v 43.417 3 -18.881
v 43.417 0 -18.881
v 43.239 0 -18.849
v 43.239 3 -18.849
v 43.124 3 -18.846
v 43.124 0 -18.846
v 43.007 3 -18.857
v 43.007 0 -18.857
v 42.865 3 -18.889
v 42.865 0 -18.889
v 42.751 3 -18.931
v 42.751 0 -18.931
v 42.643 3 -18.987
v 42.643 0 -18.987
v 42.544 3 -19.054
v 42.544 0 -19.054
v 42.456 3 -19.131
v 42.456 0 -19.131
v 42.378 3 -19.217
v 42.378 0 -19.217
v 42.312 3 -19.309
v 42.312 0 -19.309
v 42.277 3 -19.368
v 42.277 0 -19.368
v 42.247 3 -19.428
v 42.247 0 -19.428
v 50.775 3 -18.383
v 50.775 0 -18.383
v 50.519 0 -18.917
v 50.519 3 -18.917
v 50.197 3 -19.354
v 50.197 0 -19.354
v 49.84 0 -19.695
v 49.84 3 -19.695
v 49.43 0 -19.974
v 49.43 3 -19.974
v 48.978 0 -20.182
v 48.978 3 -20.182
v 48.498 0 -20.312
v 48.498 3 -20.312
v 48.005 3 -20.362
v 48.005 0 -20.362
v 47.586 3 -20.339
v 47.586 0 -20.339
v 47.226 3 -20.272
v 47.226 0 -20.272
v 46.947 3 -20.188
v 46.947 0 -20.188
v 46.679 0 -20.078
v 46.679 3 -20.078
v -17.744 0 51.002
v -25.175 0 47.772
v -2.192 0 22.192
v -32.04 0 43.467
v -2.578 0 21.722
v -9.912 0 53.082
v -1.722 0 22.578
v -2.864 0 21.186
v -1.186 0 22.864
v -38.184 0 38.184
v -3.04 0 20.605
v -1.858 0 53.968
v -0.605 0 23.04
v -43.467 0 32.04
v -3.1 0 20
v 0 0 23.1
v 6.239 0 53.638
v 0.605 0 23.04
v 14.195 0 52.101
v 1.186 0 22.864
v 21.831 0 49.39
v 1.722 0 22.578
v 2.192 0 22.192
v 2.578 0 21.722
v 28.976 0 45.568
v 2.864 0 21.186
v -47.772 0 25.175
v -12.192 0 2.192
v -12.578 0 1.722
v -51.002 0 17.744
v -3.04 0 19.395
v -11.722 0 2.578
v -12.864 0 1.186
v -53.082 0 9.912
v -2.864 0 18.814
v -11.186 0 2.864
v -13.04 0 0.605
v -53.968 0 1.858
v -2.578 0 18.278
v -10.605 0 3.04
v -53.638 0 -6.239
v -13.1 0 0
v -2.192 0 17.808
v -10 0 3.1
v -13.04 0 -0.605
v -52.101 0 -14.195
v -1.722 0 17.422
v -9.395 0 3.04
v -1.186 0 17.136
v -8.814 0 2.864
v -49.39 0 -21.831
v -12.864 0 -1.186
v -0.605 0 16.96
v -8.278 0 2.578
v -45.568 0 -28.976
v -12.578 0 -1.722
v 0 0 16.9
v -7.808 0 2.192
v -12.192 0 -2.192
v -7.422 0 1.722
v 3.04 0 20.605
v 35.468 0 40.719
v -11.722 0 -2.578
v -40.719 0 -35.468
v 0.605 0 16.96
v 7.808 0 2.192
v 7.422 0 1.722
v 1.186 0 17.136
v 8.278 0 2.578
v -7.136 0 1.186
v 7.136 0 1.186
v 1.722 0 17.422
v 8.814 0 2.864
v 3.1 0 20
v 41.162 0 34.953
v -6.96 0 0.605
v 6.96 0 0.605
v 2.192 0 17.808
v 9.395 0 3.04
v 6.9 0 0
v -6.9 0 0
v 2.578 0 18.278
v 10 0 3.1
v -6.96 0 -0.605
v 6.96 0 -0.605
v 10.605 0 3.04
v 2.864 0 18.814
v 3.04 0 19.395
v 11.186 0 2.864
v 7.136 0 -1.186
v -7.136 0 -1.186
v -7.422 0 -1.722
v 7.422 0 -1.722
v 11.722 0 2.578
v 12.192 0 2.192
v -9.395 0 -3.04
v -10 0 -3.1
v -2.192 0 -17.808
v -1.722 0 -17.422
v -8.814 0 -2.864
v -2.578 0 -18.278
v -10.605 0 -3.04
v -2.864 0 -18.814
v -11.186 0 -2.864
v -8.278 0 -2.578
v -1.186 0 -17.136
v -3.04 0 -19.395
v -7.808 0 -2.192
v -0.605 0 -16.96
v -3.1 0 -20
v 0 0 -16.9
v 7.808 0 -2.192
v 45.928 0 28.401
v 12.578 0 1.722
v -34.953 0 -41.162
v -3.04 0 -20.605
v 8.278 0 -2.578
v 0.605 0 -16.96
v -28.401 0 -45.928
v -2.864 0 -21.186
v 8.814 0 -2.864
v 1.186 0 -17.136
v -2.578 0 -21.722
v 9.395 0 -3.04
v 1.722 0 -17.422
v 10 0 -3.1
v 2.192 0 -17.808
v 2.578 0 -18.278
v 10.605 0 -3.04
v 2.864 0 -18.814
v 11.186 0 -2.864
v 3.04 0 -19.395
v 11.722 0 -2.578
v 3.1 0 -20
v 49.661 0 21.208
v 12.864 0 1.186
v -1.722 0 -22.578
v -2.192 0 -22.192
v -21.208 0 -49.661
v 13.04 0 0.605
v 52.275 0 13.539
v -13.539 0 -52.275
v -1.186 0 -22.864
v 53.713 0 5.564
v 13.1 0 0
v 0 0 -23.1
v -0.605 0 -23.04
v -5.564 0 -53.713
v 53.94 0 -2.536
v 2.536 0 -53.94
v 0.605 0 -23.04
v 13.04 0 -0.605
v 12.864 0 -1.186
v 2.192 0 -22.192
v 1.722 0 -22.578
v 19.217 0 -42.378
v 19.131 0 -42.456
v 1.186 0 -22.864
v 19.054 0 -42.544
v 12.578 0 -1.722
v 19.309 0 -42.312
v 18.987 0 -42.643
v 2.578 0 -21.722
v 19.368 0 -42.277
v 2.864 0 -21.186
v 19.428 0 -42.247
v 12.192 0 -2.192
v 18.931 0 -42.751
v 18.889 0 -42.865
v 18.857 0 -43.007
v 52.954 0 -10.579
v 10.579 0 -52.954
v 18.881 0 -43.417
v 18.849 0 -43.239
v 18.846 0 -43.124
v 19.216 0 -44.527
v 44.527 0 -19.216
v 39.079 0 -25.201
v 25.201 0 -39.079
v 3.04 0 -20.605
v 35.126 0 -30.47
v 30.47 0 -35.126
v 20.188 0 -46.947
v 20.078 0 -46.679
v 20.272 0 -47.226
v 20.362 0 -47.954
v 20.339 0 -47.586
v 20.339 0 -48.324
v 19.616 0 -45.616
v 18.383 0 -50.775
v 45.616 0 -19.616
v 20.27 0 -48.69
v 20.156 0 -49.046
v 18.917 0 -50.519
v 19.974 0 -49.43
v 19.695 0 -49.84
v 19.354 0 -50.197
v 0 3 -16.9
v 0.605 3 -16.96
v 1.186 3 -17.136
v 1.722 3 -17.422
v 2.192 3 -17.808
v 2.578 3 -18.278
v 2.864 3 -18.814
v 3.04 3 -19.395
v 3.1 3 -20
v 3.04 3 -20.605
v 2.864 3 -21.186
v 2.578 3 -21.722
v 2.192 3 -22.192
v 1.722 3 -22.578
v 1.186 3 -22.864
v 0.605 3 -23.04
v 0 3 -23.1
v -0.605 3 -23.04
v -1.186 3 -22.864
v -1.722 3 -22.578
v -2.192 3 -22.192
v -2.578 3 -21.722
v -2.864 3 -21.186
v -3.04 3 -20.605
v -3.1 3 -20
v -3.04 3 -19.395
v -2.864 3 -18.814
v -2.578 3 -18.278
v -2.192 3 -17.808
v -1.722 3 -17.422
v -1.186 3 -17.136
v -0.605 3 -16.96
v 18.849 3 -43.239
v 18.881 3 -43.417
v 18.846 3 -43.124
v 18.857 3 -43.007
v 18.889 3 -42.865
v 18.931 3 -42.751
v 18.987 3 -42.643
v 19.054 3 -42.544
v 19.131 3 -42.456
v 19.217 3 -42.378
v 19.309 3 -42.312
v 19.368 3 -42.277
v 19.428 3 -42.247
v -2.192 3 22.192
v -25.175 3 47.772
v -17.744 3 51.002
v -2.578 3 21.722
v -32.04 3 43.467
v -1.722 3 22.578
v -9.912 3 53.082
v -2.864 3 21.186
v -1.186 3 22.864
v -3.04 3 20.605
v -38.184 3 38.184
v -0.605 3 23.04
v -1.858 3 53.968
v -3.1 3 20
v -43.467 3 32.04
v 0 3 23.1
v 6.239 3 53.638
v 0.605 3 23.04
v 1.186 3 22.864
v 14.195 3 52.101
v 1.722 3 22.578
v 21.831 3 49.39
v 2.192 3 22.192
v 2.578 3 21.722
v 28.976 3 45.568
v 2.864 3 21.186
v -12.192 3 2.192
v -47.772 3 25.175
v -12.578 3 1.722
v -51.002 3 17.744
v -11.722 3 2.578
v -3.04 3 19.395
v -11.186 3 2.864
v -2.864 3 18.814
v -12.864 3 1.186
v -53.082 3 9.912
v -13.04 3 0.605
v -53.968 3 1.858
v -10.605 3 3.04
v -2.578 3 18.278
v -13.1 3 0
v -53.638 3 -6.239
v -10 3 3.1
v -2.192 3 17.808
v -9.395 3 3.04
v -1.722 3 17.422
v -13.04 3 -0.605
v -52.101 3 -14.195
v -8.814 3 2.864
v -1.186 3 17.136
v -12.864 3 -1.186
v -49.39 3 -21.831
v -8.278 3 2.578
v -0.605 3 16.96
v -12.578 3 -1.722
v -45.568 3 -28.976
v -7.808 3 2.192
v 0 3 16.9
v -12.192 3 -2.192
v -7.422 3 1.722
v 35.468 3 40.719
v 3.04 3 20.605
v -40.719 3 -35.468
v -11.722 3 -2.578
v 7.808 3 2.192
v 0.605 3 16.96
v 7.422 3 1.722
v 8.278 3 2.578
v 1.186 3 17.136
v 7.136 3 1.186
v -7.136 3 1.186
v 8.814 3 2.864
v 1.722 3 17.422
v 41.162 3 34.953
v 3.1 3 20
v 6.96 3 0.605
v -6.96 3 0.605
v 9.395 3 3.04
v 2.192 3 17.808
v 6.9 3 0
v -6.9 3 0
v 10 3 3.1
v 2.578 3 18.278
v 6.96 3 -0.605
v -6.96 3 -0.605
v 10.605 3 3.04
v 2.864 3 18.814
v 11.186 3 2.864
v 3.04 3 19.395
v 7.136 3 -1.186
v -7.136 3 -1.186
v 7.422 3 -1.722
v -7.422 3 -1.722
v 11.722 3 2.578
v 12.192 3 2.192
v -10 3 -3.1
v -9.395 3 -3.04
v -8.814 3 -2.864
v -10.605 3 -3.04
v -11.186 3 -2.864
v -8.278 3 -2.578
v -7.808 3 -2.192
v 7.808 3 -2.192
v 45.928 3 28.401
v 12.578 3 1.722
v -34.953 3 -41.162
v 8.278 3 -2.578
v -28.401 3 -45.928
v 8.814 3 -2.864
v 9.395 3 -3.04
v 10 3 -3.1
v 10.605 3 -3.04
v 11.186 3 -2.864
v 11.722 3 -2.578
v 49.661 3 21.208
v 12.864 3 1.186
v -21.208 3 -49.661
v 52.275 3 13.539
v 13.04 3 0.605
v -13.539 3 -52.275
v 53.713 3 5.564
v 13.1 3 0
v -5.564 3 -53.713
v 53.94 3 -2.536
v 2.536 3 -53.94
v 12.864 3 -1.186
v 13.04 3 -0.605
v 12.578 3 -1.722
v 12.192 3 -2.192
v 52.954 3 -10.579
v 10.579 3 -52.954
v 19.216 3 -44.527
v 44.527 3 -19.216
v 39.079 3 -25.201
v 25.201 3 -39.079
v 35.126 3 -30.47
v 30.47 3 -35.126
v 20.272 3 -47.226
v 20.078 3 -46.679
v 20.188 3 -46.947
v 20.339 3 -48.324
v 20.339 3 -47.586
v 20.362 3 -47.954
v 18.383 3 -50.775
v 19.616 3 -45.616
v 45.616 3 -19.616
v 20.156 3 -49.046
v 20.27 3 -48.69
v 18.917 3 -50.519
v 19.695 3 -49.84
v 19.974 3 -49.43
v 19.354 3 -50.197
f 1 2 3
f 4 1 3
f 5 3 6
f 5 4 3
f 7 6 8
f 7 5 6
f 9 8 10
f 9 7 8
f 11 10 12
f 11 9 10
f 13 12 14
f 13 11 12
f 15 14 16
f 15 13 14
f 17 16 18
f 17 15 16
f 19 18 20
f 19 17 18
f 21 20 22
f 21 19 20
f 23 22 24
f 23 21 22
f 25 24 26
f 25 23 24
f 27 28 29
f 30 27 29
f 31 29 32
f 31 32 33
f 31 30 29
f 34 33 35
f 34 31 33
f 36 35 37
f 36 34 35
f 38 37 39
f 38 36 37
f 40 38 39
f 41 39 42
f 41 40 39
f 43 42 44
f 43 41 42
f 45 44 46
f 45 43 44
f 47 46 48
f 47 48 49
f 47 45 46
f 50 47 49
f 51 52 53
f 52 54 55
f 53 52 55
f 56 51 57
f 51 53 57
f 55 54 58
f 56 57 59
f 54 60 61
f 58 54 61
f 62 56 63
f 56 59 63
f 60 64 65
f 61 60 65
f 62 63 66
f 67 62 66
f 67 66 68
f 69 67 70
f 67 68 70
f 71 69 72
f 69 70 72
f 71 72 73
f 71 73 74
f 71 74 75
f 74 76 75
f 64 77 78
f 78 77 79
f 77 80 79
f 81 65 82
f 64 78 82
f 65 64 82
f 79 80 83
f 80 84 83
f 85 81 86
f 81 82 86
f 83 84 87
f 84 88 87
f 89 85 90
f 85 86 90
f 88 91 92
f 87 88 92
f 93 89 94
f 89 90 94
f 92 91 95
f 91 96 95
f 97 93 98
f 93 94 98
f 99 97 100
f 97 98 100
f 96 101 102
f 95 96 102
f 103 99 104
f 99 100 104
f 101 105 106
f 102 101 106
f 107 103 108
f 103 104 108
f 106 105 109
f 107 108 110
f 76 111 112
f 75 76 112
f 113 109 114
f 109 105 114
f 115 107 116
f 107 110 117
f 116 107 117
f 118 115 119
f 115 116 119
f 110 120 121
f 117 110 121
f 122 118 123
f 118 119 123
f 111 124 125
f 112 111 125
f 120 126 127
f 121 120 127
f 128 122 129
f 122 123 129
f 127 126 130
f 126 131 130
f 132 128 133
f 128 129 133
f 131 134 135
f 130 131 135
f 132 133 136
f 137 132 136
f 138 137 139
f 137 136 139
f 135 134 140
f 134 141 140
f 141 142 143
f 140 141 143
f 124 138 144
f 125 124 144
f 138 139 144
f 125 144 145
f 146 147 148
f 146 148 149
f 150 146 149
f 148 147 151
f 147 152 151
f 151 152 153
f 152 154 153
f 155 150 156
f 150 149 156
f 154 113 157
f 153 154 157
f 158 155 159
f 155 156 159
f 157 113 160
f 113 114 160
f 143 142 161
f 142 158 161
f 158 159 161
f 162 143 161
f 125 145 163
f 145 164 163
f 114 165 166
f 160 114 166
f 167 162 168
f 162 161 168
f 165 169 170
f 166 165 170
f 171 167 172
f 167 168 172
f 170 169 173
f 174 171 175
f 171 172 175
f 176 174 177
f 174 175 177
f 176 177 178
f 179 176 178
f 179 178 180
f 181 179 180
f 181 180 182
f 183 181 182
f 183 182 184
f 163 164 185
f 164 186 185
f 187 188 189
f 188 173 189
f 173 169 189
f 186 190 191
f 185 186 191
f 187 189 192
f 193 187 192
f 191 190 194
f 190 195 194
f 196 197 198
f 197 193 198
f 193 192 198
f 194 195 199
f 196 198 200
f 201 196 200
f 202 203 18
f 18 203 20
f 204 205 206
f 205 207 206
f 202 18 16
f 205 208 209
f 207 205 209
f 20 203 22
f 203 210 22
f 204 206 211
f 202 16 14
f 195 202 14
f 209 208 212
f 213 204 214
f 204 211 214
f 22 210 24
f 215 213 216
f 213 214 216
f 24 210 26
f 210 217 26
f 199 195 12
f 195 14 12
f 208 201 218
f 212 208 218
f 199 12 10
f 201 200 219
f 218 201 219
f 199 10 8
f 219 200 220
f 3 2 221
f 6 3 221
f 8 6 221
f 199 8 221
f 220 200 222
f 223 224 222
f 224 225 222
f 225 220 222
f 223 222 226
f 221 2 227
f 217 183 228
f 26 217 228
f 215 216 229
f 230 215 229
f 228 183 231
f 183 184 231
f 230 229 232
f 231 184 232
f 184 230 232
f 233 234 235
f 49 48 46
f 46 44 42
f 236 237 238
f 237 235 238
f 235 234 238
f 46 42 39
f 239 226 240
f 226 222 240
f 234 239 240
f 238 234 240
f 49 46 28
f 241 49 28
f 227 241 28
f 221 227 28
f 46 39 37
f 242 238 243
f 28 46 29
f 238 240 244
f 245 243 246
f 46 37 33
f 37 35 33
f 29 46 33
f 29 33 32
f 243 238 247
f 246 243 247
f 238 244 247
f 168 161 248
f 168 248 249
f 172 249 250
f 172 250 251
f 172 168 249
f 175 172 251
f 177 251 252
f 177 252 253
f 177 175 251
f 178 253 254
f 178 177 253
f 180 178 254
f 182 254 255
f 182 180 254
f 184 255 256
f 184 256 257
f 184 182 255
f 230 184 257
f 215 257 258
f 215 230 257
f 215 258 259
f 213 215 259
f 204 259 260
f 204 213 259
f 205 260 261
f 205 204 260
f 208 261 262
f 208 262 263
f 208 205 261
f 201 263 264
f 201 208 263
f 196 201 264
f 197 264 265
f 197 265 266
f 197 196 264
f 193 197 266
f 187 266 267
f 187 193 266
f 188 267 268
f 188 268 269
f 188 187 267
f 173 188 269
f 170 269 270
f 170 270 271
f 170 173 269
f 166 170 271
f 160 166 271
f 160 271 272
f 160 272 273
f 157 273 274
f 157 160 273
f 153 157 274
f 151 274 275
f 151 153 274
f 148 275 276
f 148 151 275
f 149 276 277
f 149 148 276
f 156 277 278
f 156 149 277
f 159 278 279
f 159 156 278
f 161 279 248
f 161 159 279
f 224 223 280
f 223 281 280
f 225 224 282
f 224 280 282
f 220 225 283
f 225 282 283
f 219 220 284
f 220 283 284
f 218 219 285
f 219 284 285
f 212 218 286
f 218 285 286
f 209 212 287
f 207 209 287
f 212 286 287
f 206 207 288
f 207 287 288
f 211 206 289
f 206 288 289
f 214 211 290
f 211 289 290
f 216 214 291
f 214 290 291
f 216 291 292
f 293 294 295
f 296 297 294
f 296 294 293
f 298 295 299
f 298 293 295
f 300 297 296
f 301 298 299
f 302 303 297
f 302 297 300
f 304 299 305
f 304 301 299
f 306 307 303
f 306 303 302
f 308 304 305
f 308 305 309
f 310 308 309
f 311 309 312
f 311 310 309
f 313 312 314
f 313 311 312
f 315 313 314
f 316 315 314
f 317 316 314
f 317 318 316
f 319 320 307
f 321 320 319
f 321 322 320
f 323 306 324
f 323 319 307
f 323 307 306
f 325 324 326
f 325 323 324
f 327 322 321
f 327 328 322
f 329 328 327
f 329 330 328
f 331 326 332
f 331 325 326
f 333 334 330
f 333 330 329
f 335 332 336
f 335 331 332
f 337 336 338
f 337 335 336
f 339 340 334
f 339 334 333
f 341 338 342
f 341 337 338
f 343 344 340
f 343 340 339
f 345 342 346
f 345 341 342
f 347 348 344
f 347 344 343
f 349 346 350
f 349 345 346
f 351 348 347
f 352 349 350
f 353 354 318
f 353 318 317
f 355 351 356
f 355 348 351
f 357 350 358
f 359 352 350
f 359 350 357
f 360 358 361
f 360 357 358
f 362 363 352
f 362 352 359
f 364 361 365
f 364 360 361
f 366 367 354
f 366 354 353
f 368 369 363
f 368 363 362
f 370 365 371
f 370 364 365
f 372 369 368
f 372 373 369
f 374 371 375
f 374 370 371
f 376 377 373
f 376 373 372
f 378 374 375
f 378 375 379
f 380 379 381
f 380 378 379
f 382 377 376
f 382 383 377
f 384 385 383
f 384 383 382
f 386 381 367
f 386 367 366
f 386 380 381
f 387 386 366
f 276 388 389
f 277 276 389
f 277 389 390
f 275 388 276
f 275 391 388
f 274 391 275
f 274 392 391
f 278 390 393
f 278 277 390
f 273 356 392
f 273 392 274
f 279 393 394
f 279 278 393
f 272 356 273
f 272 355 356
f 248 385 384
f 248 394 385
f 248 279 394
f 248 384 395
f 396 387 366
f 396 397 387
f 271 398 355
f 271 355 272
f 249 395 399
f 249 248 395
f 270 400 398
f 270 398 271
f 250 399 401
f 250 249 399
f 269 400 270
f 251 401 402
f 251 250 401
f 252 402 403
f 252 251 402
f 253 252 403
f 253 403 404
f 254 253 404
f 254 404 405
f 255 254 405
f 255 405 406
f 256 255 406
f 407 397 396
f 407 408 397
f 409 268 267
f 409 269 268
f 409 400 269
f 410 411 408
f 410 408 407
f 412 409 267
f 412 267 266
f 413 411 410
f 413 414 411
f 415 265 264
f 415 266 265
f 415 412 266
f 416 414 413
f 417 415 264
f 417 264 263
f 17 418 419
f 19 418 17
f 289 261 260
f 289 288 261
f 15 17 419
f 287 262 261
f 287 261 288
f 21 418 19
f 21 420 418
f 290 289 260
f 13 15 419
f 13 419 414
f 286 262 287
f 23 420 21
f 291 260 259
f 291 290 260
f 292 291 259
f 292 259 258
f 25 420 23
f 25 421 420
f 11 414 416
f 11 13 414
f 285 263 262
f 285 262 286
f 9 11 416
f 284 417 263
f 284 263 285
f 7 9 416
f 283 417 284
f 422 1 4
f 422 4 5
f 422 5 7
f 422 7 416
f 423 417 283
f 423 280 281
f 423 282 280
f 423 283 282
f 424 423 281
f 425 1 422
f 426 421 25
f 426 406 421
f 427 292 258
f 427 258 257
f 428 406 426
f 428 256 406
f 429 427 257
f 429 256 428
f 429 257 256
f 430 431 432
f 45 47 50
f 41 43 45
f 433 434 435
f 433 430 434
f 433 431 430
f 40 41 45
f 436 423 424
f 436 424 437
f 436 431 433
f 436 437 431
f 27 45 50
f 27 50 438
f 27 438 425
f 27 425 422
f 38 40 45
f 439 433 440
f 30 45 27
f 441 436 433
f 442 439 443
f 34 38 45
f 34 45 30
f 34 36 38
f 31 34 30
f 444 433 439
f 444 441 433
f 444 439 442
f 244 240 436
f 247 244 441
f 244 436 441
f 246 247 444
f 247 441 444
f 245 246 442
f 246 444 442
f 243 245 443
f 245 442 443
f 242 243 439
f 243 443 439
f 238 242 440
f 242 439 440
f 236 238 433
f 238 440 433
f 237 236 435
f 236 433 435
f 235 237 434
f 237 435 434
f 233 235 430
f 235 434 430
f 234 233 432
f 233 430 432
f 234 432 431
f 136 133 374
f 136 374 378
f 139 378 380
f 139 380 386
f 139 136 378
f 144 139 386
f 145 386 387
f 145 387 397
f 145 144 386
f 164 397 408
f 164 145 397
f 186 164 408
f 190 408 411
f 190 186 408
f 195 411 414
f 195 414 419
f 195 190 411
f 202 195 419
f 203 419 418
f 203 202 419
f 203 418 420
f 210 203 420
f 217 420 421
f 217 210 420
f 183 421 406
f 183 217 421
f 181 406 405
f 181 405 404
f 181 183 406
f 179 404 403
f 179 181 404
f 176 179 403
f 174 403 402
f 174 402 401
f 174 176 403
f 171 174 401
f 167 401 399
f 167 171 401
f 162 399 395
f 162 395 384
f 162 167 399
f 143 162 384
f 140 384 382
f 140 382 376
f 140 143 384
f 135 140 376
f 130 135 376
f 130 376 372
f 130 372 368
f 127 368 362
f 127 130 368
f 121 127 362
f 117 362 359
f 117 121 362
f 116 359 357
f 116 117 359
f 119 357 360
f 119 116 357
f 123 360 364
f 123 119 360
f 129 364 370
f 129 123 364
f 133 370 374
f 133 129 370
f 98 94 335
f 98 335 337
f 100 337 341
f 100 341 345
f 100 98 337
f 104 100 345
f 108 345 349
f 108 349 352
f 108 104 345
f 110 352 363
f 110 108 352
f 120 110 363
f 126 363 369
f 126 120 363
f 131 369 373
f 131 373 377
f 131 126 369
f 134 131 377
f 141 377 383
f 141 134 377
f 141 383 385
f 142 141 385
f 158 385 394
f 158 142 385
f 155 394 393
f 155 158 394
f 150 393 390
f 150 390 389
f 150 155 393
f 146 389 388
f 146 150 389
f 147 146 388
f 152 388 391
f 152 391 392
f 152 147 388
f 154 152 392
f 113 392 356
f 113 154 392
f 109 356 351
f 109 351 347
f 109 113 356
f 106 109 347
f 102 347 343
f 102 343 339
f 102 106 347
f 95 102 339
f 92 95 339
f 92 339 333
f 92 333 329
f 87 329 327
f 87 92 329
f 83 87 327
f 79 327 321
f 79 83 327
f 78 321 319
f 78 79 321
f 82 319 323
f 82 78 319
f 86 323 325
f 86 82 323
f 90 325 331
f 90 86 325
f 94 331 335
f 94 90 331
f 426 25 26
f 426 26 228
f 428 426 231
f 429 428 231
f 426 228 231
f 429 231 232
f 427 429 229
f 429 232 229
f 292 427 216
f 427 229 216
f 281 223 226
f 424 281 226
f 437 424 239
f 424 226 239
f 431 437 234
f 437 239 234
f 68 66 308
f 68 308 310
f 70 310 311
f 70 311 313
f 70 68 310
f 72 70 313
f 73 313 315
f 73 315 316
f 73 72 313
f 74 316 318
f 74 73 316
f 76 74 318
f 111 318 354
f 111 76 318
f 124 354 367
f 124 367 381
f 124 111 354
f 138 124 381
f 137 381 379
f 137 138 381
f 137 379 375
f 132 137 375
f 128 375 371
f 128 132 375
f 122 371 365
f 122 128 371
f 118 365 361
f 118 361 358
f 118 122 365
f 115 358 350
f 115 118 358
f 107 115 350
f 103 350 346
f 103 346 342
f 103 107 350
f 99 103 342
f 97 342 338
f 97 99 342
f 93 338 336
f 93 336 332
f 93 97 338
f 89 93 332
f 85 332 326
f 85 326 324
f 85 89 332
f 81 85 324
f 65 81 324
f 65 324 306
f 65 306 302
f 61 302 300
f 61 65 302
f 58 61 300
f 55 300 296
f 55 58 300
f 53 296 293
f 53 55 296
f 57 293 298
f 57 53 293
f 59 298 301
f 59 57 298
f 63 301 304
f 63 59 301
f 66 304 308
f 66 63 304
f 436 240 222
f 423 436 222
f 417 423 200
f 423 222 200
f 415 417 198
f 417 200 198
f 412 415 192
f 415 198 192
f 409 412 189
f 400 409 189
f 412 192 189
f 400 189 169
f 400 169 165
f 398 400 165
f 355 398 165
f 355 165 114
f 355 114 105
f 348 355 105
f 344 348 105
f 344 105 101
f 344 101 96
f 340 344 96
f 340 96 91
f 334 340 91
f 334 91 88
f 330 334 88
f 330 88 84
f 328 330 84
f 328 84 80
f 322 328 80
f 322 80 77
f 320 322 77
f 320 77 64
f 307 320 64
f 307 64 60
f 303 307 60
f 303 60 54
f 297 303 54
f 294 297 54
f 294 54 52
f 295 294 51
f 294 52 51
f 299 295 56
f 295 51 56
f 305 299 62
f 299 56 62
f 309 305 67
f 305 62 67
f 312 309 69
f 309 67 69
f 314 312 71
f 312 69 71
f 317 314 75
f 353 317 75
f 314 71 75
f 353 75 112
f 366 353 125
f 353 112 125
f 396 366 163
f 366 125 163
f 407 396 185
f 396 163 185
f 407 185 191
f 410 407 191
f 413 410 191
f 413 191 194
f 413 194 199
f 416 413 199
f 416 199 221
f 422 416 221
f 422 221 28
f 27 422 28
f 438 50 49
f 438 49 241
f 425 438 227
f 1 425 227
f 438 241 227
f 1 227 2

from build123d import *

# Parameters (mm, degrees)
SKETCH1_R           = 3.1
BOSS_EXTRUDE1_DEPTH = 3
FILLET1_R           = 3
FILLET2_R           = 1


with BuildPart() as part:
    # Sketch1 → Boss-Extrude1 (new body)
    with BuildSketch(Plane(origin=(0, 0, 0), x_dir=(1, 0, 0), z_dir=(0, 1, 0))):
        with BuildLine():
            ThreePointArc((21.667324002, 49.462380357), (-38.183766184, -38.183766184), (49.462380357, 21.667324002))
            ThreePointArc((49.462380357, 21.667324002), (46.165505457, 19.845504593), (42.585510083, 18.674162122))
            ThreePointArc((42.585510083, 18.674162122), (32.880465325, 32.880465325), (18.674162122, 42.585510083))
            ThreePointArc((18.674162122, 42.585510083), (19.845504593, 46.165505457), (21.667324002, 49.462380357))
        make_face()
        with Locations(Location((10, 0, 0), (0, 0, 270))):
            Circle(SKETCH1_R, mode=Mode.SUBTRACT)
        with Locations(Location((0, 20, 0), (0, 0, 270))):
            Circle(SKETCH1_R, mode=Mode.SUBTRACT)
        with Locations(Location((0, -20, 0), (0, 0, 270))):
            Circle(SKETCH1_R, mode=Mode.SUBTRACT)
        with Locations(Location((-10, 0, 0), (0, 0, 270))):
            Circle(SKETCH1_R, mode=Mode.SUBTRACT)
    extrude(amount=BOSS_EXTRUDE1_DEPTH)

    # Fillet1
    fillet1_edges = [part.edges().sort_by_distance(p)[0] for p in [
        (49.462380357, 1.5, -21.667324002),
        (21.667324002, 1.5, -49.462380357),
    ]]
    fillet(fillet1_edges, radius=FILLET1_R)

    # Fillet2
    fillet2_edges = [part.edges().sort_by_distance(p)[0] for p in [
        (18.674162122, 1.5, -42.585510083),
        (42.585510083, 1.5, -18.674162122),
    ]]
    fillet(fillet2_edges, radius=FILLET2_R)


solid = part.part
